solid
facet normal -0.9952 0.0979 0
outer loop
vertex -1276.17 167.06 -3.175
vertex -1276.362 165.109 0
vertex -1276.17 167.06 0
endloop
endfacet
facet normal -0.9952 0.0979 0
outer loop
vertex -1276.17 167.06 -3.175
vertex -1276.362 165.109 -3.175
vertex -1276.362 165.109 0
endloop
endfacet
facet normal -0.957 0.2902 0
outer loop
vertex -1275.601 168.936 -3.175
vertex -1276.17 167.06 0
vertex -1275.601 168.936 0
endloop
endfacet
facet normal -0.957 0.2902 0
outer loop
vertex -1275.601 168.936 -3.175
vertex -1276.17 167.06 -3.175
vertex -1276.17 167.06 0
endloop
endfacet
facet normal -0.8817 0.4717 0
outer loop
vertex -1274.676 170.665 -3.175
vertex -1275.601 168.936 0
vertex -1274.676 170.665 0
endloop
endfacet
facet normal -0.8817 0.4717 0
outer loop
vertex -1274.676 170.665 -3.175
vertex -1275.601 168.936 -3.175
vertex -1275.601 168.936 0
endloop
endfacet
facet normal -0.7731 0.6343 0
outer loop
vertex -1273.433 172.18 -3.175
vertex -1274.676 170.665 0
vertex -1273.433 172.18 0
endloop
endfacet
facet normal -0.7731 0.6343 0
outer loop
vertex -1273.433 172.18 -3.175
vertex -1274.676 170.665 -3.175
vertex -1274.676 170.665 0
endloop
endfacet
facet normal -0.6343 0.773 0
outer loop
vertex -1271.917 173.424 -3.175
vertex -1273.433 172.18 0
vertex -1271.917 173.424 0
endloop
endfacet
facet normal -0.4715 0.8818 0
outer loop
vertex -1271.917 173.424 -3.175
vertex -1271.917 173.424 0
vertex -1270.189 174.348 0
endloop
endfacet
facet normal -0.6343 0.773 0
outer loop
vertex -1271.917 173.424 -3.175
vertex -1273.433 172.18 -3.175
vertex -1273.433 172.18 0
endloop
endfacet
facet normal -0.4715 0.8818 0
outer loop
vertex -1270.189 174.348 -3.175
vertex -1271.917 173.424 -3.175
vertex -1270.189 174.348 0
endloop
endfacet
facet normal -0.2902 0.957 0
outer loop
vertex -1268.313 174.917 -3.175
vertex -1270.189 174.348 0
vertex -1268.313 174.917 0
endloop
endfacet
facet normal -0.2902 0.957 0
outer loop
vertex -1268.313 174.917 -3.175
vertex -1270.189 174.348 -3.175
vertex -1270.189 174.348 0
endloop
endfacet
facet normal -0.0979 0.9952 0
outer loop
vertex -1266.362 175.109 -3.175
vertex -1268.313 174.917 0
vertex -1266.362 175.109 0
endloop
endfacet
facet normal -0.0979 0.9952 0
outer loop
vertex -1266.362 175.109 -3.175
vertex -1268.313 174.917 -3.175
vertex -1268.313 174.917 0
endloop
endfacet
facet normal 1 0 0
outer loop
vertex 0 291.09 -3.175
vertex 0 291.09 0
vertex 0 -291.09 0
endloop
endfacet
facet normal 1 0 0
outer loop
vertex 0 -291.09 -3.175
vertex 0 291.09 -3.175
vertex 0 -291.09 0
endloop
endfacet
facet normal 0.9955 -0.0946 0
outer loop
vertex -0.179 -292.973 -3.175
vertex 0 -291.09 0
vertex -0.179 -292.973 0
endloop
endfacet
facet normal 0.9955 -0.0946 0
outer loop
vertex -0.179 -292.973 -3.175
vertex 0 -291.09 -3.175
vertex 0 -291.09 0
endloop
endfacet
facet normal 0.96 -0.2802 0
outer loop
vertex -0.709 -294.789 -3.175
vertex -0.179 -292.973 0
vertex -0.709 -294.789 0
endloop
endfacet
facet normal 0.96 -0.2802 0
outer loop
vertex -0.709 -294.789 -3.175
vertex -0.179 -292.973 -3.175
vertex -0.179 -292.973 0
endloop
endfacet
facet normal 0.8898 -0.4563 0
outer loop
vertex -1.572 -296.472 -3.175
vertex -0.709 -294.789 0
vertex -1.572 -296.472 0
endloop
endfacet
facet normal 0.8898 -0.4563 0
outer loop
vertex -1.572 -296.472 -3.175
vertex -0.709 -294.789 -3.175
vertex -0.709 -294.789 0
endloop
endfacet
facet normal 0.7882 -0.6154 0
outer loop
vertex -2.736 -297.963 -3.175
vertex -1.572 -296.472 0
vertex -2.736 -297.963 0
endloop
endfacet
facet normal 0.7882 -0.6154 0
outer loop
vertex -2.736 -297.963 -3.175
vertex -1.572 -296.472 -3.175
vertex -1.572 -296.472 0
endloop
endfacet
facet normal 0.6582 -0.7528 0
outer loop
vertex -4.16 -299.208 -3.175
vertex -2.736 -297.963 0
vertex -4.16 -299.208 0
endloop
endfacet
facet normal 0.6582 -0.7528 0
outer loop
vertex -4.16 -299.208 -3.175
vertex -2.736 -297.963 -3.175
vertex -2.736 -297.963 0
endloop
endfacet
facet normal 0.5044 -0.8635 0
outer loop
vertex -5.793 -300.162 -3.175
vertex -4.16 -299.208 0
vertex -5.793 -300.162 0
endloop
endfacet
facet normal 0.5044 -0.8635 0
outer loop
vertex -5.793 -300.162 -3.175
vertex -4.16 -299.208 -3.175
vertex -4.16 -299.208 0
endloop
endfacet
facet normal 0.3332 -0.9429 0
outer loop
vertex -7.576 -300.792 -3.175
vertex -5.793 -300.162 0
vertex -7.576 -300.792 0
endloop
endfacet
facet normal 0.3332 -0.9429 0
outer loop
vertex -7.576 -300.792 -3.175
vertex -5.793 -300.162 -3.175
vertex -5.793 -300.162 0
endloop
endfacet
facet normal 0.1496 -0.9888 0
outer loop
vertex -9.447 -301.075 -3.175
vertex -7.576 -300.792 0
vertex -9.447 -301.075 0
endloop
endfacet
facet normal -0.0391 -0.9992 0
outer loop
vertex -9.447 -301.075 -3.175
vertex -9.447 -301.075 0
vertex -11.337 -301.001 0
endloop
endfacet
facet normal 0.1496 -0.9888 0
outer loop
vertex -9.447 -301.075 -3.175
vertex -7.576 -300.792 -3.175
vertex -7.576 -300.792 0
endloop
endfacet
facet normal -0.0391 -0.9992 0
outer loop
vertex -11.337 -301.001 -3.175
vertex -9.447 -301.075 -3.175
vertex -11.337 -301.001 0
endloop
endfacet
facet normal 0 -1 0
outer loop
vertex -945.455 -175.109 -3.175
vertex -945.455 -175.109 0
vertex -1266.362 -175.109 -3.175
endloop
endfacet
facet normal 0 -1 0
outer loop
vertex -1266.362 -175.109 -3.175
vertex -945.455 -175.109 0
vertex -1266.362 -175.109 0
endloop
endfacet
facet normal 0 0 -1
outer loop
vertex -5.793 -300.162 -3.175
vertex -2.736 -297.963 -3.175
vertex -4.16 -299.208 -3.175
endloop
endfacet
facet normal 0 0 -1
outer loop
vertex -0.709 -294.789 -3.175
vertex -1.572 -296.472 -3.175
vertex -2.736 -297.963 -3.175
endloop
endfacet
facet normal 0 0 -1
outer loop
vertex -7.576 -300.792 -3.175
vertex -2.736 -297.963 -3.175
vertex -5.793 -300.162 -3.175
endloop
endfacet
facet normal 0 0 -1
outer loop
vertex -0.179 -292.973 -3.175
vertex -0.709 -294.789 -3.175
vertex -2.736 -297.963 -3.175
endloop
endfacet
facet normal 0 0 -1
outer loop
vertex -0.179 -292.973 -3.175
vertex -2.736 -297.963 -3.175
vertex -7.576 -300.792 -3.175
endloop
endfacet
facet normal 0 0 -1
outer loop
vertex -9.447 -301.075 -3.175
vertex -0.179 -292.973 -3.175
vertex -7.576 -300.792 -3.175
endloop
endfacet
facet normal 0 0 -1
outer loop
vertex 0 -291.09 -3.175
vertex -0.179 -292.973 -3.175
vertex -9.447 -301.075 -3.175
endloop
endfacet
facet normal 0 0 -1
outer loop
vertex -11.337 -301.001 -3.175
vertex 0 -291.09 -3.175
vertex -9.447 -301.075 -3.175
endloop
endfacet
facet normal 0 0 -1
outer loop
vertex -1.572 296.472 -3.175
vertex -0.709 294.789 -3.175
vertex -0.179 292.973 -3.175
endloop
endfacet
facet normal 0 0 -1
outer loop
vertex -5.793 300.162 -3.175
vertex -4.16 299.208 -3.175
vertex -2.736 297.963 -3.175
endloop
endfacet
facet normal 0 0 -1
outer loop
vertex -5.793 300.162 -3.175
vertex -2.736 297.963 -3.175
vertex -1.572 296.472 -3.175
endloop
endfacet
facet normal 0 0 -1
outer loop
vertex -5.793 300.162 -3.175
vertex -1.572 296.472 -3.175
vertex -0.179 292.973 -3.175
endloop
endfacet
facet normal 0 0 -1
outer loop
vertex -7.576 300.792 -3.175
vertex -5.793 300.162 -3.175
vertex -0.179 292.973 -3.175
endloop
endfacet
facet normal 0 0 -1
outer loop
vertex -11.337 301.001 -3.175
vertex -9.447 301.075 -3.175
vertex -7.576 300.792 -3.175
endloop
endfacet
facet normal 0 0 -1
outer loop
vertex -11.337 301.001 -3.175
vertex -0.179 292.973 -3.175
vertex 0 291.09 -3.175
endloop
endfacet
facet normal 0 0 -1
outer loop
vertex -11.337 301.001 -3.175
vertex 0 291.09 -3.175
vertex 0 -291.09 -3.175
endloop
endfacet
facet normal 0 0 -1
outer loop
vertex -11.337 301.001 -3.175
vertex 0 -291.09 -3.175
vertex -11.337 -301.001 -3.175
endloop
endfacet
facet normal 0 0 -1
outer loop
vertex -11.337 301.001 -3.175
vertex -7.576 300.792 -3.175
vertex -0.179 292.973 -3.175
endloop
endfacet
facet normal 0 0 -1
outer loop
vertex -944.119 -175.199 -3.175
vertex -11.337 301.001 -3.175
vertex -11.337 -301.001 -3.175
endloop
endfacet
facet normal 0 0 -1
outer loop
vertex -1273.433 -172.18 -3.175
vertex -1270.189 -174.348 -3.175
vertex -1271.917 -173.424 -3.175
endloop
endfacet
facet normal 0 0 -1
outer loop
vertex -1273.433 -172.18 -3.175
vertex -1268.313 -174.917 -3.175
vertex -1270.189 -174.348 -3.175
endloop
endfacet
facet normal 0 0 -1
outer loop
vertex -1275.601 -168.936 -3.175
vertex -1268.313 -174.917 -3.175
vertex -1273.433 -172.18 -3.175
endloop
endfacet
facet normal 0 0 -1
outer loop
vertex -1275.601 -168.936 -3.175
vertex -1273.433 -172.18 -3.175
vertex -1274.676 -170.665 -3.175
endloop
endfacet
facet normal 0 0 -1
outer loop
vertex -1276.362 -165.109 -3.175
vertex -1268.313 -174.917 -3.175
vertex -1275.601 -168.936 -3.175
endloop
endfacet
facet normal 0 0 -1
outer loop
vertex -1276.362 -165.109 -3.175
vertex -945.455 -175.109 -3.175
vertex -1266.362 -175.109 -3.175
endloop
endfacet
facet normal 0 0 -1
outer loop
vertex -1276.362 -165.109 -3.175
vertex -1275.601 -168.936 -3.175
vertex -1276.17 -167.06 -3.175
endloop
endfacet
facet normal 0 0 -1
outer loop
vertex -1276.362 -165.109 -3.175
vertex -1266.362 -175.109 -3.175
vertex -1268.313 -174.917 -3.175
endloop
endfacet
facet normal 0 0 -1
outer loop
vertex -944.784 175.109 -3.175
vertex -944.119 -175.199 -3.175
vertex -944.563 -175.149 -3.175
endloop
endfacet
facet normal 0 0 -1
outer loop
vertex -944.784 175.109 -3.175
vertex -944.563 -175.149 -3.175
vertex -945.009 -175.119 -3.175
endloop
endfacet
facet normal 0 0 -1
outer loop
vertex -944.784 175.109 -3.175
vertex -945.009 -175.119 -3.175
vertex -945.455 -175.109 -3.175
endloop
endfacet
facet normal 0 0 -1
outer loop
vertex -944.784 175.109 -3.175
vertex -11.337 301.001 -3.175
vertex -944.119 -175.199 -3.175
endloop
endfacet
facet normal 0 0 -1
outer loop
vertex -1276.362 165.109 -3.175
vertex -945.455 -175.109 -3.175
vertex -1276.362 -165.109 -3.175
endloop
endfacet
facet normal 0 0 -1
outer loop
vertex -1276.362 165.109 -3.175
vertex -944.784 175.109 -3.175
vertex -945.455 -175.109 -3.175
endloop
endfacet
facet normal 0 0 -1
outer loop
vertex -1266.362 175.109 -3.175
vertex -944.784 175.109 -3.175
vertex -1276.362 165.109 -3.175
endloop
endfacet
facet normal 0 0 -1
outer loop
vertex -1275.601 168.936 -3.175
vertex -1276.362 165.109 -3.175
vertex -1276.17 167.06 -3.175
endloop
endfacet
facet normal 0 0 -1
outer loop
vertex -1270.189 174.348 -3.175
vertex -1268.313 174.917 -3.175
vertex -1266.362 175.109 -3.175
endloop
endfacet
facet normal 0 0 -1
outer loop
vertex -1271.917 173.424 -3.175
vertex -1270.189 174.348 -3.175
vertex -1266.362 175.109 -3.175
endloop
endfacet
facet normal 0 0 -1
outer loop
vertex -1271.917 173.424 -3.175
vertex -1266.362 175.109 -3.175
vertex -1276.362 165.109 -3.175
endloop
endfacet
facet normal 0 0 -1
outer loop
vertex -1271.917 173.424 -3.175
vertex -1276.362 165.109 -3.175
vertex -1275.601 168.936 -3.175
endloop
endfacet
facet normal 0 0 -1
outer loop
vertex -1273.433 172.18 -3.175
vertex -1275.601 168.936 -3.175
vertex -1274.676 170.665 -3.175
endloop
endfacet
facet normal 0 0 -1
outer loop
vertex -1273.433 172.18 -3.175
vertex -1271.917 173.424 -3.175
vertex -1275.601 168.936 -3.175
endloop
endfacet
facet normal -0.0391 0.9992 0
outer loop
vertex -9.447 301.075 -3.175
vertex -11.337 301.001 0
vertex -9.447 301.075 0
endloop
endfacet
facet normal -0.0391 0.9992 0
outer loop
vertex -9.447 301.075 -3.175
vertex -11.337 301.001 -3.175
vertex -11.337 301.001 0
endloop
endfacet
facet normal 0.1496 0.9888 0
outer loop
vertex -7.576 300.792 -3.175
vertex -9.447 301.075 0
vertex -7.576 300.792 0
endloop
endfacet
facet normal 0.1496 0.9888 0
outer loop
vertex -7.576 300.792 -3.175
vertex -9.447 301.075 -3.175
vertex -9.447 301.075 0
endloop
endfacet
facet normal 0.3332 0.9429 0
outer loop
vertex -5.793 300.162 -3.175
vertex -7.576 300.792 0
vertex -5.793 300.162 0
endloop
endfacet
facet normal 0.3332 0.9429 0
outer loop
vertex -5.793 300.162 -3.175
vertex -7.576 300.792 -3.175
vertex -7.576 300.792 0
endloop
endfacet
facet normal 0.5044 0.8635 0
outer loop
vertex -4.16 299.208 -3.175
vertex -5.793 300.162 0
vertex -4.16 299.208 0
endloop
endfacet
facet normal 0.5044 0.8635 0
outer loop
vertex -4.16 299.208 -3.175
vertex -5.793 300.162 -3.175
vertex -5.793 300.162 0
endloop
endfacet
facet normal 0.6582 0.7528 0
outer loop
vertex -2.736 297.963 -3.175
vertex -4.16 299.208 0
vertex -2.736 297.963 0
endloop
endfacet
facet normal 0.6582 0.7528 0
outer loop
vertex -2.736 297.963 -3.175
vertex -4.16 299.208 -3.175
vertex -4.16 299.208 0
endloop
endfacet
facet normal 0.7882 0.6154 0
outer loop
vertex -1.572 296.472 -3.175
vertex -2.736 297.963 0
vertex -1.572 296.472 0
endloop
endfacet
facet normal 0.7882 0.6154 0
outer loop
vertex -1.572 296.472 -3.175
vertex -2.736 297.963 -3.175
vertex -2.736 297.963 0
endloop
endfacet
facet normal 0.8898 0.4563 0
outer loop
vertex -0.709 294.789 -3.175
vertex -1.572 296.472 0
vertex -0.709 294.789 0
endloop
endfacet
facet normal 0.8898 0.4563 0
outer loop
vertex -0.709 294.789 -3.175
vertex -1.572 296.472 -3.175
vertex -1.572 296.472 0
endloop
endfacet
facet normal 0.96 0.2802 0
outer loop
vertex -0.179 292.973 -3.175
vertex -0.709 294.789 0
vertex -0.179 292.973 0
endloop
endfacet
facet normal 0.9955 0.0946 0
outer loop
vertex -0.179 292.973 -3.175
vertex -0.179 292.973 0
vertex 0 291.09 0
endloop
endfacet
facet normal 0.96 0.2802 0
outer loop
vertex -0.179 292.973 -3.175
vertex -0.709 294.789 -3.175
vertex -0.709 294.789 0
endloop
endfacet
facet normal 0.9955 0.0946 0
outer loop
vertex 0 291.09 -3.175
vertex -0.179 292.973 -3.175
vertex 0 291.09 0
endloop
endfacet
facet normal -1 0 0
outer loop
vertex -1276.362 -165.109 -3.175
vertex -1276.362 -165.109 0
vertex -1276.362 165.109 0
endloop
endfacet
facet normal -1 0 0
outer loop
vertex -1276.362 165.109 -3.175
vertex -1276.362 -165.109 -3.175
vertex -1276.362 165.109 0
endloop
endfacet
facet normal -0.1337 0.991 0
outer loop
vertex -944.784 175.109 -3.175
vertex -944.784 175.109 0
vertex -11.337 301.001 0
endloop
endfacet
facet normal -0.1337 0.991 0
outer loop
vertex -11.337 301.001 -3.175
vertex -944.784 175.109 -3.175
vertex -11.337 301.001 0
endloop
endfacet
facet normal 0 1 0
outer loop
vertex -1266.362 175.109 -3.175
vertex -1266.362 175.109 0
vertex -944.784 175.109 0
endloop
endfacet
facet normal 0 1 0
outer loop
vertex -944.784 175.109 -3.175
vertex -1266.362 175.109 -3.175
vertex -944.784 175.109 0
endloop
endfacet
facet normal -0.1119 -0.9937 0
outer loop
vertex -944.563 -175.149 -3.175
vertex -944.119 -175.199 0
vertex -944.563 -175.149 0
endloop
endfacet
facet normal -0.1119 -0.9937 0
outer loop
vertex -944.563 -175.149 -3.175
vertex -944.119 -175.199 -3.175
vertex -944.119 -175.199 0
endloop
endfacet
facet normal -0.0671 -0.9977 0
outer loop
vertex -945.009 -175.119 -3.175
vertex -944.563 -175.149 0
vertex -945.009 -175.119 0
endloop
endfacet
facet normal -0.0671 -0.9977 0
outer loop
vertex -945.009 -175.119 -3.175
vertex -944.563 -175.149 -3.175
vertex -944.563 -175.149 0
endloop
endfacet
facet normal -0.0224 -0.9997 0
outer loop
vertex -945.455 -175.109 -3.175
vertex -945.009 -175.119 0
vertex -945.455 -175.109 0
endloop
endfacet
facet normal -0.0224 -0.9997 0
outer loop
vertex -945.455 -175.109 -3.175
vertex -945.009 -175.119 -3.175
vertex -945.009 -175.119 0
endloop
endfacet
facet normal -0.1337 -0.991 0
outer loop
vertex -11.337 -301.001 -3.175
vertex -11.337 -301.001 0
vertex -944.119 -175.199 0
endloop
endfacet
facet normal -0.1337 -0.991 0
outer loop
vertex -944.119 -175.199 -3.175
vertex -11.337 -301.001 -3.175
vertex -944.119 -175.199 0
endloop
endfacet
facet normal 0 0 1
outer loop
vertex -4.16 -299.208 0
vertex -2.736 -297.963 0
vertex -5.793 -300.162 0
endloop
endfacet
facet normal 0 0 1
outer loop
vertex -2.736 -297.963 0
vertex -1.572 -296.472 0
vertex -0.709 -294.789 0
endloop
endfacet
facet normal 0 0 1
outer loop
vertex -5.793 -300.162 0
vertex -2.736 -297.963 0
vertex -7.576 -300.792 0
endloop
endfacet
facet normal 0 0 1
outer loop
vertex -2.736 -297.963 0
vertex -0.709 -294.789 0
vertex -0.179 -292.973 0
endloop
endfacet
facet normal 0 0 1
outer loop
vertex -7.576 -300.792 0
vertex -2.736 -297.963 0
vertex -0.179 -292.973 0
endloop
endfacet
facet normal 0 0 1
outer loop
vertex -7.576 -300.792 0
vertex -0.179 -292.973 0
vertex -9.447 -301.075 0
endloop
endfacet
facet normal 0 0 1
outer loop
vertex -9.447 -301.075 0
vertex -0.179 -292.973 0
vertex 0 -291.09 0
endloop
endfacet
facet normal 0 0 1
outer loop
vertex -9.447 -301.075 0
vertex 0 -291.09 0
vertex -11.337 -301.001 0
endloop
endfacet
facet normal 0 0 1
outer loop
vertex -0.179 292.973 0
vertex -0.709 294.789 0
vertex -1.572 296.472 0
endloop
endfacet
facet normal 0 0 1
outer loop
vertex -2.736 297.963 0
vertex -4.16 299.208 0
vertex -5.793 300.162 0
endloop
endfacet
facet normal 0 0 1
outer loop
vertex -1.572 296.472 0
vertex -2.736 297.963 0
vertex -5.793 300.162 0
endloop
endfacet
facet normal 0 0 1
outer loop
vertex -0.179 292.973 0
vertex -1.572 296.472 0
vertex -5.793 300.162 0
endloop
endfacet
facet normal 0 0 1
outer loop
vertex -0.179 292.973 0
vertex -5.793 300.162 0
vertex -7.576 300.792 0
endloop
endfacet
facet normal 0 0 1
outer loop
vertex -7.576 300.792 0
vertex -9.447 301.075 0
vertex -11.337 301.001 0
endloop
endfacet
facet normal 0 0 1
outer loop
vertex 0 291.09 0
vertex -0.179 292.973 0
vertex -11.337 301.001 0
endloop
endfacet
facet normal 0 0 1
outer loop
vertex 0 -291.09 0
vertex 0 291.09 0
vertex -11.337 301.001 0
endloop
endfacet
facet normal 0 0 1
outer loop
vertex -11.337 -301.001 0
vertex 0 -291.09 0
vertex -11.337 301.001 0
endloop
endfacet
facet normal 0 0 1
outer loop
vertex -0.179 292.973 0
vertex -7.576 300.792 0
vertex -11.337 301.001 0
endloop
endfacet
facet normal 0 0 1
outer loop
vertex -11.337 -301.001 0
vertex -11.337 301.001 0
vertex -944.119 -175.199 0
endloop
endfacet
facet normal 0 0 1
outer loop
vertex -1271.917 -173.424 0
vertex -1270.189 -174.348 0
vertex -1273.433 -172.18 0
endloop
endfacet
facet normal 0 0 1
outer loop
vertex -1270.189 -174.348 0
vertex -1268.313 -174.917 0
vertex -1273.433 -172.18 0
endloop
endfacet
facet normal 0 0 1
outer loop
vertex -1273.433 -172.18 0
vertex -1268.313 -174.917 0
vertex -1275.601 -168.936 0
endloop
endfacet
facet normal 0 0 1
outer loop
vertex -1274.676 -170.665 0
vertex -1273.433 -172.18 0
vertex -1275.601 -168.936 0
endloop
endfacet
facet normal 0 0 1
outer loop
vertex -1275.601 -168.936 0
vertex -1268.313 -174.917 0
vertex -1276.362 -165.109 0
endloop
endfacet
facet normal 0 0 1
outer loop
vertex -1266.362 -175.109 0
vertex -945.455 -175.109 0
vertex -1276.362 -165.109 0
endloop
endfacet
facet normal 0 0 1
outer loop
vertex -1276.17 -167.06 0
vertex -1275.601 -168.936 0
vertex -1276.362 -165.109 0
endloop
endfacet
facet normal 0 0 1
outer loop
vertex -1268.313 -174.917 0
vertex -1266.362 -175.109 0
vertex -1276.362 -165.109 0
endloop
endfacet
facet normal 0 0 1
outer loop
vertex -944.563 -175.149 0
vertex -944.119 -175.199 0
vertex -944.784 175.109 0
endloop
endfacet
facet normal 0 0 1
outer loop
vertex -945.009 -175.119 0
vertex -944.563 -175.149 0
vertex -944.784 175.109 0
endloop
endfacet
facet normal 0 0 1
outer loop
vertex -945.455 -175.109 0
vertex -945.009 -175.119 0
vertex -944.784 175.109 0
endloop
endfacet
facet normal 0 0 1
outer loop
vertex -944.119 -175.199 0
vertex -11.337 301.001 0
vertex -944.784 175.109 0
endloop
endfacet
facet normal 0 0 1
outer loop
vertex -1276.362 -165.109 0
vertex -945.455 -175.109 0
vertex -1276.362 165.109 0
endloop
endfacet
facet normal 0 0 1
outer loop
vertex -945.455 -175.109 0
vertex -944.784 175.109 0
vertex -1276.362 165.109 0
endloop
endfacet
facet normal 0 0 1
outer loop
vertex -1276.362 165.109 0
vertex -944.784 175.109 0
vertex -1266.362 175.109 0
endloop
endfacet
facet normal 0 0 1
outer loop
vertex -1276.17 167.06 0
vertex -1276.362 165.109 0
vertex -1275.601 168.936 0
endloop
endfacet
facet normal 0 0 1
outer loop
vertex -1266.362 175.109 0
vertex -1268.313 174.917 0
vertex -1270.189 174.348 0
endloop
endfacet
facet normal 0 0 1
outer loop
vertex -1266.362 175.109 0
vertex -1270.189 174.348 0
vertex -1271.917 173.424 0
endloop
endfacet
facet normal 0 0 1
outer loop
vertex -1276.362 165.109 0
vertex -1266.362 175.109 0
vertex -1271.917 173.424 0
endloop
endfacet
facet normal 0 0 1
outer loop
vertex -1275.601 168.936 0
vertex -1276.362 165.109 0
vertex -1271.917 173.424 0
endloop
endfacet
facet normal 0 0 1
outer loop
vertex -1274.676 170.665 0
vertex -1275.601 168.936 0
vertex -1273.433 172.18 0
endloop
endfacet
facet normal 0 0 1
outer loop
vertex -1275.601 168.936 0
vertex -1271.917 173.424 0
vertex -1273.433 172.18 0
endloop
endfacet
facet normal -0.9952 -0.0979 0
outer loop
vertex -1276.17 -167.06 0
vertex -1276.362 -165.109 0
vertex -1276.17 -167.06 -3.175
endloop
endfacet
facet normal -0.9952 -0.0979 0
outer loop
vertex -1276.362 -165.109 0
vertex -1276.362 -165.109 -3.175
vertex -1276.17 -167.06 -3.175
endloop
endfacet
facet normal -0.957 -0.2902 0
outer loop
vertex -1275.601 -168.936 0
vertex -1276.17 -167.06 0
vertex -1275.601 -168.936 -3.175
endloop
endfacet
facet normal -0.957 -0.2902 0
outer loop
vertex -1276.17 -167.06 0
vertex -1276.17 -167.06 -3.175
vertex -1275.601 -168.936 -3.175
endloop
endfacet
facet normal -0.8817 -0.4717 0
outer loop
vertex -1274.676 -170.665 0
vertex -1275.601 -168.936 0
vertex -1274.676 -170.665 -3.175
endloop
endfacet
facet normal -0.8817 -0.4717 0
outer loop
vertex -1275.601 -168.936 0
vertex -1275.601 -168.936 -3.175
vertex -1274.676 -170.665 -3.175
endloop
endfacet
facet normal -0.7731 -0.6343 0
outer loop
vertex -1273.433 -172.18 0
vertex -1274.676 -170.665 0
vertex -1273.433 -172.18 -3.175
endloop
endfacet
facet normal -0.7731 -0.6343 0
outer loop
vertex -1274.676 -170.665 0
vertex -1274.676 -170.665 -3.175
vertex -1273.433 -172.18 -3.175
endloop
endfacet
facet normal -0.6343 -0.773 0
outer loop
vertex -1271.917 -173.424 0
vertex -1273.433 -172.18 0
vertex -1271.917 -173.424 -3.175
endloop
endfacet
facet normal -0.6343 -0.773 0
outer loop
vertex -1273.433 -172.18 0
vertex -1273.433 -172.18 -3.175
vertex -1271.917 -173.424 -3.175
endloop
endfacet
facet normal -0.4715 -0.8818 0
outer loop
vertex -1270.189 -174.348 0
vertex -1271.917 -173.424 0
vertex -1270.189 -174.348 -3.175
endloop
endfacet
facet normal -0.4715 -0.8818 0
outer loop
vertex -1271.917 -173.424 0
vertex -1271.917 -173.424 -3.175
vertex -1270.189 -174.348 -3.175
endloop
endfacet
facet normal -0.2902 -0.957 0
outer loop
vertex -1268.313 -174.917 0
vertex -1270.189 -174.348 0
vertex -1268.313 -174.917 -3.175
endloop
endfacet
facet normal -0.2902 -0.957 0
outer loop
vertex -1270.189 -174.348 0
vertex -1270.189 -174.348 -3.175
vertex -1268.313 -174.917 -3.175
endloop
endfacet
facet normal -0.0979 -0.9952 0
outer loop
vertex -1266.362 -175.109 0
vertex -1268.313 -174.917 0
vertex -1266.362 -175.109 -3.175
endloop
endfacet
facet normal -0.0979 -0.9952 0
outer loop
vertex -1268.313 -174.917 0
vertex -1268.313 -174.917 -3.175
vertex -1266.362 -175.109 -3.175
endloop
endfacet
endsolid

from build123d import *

# Parameters (mm, degrees)
BASE_FLANGE1_DEPTH = 3.175
FILLET1_R          = 10


# Sheet-metal steps are written as plain solids
with BuildPart() as part:
    # Sketch2 → Base-Flange1 (new body)
    with BuildSketch(Plane.XY):
        Polygon((-1276.361705331, -175.10923744), (-1276.361705331, 175.10923744), (-944.783937855, 175.10923744), (0, 302.529477003), (0, -302.529477003), (-944.783937855, -175.10923744), align=None)
    extrude(amount=-BASE_FLANGE1_DEPTH)

    # Fillet1
    fillet1_edges = [part.edges().sort_by_distance(p)[0] for p in [
        (0, 302.529477003, -1.5875),
        (0, -302.529477003, -1.5875),
        (-944.783937855, -175.10923744, -1.5875),
        (-1276.361705331, -175.10923744, -1.5875),
        (-1276.361705331, 175.10923744, -1.5875),
    ]]
    fillet(fillet1_edges, radius=FILLET1_R)


solid = part.part
